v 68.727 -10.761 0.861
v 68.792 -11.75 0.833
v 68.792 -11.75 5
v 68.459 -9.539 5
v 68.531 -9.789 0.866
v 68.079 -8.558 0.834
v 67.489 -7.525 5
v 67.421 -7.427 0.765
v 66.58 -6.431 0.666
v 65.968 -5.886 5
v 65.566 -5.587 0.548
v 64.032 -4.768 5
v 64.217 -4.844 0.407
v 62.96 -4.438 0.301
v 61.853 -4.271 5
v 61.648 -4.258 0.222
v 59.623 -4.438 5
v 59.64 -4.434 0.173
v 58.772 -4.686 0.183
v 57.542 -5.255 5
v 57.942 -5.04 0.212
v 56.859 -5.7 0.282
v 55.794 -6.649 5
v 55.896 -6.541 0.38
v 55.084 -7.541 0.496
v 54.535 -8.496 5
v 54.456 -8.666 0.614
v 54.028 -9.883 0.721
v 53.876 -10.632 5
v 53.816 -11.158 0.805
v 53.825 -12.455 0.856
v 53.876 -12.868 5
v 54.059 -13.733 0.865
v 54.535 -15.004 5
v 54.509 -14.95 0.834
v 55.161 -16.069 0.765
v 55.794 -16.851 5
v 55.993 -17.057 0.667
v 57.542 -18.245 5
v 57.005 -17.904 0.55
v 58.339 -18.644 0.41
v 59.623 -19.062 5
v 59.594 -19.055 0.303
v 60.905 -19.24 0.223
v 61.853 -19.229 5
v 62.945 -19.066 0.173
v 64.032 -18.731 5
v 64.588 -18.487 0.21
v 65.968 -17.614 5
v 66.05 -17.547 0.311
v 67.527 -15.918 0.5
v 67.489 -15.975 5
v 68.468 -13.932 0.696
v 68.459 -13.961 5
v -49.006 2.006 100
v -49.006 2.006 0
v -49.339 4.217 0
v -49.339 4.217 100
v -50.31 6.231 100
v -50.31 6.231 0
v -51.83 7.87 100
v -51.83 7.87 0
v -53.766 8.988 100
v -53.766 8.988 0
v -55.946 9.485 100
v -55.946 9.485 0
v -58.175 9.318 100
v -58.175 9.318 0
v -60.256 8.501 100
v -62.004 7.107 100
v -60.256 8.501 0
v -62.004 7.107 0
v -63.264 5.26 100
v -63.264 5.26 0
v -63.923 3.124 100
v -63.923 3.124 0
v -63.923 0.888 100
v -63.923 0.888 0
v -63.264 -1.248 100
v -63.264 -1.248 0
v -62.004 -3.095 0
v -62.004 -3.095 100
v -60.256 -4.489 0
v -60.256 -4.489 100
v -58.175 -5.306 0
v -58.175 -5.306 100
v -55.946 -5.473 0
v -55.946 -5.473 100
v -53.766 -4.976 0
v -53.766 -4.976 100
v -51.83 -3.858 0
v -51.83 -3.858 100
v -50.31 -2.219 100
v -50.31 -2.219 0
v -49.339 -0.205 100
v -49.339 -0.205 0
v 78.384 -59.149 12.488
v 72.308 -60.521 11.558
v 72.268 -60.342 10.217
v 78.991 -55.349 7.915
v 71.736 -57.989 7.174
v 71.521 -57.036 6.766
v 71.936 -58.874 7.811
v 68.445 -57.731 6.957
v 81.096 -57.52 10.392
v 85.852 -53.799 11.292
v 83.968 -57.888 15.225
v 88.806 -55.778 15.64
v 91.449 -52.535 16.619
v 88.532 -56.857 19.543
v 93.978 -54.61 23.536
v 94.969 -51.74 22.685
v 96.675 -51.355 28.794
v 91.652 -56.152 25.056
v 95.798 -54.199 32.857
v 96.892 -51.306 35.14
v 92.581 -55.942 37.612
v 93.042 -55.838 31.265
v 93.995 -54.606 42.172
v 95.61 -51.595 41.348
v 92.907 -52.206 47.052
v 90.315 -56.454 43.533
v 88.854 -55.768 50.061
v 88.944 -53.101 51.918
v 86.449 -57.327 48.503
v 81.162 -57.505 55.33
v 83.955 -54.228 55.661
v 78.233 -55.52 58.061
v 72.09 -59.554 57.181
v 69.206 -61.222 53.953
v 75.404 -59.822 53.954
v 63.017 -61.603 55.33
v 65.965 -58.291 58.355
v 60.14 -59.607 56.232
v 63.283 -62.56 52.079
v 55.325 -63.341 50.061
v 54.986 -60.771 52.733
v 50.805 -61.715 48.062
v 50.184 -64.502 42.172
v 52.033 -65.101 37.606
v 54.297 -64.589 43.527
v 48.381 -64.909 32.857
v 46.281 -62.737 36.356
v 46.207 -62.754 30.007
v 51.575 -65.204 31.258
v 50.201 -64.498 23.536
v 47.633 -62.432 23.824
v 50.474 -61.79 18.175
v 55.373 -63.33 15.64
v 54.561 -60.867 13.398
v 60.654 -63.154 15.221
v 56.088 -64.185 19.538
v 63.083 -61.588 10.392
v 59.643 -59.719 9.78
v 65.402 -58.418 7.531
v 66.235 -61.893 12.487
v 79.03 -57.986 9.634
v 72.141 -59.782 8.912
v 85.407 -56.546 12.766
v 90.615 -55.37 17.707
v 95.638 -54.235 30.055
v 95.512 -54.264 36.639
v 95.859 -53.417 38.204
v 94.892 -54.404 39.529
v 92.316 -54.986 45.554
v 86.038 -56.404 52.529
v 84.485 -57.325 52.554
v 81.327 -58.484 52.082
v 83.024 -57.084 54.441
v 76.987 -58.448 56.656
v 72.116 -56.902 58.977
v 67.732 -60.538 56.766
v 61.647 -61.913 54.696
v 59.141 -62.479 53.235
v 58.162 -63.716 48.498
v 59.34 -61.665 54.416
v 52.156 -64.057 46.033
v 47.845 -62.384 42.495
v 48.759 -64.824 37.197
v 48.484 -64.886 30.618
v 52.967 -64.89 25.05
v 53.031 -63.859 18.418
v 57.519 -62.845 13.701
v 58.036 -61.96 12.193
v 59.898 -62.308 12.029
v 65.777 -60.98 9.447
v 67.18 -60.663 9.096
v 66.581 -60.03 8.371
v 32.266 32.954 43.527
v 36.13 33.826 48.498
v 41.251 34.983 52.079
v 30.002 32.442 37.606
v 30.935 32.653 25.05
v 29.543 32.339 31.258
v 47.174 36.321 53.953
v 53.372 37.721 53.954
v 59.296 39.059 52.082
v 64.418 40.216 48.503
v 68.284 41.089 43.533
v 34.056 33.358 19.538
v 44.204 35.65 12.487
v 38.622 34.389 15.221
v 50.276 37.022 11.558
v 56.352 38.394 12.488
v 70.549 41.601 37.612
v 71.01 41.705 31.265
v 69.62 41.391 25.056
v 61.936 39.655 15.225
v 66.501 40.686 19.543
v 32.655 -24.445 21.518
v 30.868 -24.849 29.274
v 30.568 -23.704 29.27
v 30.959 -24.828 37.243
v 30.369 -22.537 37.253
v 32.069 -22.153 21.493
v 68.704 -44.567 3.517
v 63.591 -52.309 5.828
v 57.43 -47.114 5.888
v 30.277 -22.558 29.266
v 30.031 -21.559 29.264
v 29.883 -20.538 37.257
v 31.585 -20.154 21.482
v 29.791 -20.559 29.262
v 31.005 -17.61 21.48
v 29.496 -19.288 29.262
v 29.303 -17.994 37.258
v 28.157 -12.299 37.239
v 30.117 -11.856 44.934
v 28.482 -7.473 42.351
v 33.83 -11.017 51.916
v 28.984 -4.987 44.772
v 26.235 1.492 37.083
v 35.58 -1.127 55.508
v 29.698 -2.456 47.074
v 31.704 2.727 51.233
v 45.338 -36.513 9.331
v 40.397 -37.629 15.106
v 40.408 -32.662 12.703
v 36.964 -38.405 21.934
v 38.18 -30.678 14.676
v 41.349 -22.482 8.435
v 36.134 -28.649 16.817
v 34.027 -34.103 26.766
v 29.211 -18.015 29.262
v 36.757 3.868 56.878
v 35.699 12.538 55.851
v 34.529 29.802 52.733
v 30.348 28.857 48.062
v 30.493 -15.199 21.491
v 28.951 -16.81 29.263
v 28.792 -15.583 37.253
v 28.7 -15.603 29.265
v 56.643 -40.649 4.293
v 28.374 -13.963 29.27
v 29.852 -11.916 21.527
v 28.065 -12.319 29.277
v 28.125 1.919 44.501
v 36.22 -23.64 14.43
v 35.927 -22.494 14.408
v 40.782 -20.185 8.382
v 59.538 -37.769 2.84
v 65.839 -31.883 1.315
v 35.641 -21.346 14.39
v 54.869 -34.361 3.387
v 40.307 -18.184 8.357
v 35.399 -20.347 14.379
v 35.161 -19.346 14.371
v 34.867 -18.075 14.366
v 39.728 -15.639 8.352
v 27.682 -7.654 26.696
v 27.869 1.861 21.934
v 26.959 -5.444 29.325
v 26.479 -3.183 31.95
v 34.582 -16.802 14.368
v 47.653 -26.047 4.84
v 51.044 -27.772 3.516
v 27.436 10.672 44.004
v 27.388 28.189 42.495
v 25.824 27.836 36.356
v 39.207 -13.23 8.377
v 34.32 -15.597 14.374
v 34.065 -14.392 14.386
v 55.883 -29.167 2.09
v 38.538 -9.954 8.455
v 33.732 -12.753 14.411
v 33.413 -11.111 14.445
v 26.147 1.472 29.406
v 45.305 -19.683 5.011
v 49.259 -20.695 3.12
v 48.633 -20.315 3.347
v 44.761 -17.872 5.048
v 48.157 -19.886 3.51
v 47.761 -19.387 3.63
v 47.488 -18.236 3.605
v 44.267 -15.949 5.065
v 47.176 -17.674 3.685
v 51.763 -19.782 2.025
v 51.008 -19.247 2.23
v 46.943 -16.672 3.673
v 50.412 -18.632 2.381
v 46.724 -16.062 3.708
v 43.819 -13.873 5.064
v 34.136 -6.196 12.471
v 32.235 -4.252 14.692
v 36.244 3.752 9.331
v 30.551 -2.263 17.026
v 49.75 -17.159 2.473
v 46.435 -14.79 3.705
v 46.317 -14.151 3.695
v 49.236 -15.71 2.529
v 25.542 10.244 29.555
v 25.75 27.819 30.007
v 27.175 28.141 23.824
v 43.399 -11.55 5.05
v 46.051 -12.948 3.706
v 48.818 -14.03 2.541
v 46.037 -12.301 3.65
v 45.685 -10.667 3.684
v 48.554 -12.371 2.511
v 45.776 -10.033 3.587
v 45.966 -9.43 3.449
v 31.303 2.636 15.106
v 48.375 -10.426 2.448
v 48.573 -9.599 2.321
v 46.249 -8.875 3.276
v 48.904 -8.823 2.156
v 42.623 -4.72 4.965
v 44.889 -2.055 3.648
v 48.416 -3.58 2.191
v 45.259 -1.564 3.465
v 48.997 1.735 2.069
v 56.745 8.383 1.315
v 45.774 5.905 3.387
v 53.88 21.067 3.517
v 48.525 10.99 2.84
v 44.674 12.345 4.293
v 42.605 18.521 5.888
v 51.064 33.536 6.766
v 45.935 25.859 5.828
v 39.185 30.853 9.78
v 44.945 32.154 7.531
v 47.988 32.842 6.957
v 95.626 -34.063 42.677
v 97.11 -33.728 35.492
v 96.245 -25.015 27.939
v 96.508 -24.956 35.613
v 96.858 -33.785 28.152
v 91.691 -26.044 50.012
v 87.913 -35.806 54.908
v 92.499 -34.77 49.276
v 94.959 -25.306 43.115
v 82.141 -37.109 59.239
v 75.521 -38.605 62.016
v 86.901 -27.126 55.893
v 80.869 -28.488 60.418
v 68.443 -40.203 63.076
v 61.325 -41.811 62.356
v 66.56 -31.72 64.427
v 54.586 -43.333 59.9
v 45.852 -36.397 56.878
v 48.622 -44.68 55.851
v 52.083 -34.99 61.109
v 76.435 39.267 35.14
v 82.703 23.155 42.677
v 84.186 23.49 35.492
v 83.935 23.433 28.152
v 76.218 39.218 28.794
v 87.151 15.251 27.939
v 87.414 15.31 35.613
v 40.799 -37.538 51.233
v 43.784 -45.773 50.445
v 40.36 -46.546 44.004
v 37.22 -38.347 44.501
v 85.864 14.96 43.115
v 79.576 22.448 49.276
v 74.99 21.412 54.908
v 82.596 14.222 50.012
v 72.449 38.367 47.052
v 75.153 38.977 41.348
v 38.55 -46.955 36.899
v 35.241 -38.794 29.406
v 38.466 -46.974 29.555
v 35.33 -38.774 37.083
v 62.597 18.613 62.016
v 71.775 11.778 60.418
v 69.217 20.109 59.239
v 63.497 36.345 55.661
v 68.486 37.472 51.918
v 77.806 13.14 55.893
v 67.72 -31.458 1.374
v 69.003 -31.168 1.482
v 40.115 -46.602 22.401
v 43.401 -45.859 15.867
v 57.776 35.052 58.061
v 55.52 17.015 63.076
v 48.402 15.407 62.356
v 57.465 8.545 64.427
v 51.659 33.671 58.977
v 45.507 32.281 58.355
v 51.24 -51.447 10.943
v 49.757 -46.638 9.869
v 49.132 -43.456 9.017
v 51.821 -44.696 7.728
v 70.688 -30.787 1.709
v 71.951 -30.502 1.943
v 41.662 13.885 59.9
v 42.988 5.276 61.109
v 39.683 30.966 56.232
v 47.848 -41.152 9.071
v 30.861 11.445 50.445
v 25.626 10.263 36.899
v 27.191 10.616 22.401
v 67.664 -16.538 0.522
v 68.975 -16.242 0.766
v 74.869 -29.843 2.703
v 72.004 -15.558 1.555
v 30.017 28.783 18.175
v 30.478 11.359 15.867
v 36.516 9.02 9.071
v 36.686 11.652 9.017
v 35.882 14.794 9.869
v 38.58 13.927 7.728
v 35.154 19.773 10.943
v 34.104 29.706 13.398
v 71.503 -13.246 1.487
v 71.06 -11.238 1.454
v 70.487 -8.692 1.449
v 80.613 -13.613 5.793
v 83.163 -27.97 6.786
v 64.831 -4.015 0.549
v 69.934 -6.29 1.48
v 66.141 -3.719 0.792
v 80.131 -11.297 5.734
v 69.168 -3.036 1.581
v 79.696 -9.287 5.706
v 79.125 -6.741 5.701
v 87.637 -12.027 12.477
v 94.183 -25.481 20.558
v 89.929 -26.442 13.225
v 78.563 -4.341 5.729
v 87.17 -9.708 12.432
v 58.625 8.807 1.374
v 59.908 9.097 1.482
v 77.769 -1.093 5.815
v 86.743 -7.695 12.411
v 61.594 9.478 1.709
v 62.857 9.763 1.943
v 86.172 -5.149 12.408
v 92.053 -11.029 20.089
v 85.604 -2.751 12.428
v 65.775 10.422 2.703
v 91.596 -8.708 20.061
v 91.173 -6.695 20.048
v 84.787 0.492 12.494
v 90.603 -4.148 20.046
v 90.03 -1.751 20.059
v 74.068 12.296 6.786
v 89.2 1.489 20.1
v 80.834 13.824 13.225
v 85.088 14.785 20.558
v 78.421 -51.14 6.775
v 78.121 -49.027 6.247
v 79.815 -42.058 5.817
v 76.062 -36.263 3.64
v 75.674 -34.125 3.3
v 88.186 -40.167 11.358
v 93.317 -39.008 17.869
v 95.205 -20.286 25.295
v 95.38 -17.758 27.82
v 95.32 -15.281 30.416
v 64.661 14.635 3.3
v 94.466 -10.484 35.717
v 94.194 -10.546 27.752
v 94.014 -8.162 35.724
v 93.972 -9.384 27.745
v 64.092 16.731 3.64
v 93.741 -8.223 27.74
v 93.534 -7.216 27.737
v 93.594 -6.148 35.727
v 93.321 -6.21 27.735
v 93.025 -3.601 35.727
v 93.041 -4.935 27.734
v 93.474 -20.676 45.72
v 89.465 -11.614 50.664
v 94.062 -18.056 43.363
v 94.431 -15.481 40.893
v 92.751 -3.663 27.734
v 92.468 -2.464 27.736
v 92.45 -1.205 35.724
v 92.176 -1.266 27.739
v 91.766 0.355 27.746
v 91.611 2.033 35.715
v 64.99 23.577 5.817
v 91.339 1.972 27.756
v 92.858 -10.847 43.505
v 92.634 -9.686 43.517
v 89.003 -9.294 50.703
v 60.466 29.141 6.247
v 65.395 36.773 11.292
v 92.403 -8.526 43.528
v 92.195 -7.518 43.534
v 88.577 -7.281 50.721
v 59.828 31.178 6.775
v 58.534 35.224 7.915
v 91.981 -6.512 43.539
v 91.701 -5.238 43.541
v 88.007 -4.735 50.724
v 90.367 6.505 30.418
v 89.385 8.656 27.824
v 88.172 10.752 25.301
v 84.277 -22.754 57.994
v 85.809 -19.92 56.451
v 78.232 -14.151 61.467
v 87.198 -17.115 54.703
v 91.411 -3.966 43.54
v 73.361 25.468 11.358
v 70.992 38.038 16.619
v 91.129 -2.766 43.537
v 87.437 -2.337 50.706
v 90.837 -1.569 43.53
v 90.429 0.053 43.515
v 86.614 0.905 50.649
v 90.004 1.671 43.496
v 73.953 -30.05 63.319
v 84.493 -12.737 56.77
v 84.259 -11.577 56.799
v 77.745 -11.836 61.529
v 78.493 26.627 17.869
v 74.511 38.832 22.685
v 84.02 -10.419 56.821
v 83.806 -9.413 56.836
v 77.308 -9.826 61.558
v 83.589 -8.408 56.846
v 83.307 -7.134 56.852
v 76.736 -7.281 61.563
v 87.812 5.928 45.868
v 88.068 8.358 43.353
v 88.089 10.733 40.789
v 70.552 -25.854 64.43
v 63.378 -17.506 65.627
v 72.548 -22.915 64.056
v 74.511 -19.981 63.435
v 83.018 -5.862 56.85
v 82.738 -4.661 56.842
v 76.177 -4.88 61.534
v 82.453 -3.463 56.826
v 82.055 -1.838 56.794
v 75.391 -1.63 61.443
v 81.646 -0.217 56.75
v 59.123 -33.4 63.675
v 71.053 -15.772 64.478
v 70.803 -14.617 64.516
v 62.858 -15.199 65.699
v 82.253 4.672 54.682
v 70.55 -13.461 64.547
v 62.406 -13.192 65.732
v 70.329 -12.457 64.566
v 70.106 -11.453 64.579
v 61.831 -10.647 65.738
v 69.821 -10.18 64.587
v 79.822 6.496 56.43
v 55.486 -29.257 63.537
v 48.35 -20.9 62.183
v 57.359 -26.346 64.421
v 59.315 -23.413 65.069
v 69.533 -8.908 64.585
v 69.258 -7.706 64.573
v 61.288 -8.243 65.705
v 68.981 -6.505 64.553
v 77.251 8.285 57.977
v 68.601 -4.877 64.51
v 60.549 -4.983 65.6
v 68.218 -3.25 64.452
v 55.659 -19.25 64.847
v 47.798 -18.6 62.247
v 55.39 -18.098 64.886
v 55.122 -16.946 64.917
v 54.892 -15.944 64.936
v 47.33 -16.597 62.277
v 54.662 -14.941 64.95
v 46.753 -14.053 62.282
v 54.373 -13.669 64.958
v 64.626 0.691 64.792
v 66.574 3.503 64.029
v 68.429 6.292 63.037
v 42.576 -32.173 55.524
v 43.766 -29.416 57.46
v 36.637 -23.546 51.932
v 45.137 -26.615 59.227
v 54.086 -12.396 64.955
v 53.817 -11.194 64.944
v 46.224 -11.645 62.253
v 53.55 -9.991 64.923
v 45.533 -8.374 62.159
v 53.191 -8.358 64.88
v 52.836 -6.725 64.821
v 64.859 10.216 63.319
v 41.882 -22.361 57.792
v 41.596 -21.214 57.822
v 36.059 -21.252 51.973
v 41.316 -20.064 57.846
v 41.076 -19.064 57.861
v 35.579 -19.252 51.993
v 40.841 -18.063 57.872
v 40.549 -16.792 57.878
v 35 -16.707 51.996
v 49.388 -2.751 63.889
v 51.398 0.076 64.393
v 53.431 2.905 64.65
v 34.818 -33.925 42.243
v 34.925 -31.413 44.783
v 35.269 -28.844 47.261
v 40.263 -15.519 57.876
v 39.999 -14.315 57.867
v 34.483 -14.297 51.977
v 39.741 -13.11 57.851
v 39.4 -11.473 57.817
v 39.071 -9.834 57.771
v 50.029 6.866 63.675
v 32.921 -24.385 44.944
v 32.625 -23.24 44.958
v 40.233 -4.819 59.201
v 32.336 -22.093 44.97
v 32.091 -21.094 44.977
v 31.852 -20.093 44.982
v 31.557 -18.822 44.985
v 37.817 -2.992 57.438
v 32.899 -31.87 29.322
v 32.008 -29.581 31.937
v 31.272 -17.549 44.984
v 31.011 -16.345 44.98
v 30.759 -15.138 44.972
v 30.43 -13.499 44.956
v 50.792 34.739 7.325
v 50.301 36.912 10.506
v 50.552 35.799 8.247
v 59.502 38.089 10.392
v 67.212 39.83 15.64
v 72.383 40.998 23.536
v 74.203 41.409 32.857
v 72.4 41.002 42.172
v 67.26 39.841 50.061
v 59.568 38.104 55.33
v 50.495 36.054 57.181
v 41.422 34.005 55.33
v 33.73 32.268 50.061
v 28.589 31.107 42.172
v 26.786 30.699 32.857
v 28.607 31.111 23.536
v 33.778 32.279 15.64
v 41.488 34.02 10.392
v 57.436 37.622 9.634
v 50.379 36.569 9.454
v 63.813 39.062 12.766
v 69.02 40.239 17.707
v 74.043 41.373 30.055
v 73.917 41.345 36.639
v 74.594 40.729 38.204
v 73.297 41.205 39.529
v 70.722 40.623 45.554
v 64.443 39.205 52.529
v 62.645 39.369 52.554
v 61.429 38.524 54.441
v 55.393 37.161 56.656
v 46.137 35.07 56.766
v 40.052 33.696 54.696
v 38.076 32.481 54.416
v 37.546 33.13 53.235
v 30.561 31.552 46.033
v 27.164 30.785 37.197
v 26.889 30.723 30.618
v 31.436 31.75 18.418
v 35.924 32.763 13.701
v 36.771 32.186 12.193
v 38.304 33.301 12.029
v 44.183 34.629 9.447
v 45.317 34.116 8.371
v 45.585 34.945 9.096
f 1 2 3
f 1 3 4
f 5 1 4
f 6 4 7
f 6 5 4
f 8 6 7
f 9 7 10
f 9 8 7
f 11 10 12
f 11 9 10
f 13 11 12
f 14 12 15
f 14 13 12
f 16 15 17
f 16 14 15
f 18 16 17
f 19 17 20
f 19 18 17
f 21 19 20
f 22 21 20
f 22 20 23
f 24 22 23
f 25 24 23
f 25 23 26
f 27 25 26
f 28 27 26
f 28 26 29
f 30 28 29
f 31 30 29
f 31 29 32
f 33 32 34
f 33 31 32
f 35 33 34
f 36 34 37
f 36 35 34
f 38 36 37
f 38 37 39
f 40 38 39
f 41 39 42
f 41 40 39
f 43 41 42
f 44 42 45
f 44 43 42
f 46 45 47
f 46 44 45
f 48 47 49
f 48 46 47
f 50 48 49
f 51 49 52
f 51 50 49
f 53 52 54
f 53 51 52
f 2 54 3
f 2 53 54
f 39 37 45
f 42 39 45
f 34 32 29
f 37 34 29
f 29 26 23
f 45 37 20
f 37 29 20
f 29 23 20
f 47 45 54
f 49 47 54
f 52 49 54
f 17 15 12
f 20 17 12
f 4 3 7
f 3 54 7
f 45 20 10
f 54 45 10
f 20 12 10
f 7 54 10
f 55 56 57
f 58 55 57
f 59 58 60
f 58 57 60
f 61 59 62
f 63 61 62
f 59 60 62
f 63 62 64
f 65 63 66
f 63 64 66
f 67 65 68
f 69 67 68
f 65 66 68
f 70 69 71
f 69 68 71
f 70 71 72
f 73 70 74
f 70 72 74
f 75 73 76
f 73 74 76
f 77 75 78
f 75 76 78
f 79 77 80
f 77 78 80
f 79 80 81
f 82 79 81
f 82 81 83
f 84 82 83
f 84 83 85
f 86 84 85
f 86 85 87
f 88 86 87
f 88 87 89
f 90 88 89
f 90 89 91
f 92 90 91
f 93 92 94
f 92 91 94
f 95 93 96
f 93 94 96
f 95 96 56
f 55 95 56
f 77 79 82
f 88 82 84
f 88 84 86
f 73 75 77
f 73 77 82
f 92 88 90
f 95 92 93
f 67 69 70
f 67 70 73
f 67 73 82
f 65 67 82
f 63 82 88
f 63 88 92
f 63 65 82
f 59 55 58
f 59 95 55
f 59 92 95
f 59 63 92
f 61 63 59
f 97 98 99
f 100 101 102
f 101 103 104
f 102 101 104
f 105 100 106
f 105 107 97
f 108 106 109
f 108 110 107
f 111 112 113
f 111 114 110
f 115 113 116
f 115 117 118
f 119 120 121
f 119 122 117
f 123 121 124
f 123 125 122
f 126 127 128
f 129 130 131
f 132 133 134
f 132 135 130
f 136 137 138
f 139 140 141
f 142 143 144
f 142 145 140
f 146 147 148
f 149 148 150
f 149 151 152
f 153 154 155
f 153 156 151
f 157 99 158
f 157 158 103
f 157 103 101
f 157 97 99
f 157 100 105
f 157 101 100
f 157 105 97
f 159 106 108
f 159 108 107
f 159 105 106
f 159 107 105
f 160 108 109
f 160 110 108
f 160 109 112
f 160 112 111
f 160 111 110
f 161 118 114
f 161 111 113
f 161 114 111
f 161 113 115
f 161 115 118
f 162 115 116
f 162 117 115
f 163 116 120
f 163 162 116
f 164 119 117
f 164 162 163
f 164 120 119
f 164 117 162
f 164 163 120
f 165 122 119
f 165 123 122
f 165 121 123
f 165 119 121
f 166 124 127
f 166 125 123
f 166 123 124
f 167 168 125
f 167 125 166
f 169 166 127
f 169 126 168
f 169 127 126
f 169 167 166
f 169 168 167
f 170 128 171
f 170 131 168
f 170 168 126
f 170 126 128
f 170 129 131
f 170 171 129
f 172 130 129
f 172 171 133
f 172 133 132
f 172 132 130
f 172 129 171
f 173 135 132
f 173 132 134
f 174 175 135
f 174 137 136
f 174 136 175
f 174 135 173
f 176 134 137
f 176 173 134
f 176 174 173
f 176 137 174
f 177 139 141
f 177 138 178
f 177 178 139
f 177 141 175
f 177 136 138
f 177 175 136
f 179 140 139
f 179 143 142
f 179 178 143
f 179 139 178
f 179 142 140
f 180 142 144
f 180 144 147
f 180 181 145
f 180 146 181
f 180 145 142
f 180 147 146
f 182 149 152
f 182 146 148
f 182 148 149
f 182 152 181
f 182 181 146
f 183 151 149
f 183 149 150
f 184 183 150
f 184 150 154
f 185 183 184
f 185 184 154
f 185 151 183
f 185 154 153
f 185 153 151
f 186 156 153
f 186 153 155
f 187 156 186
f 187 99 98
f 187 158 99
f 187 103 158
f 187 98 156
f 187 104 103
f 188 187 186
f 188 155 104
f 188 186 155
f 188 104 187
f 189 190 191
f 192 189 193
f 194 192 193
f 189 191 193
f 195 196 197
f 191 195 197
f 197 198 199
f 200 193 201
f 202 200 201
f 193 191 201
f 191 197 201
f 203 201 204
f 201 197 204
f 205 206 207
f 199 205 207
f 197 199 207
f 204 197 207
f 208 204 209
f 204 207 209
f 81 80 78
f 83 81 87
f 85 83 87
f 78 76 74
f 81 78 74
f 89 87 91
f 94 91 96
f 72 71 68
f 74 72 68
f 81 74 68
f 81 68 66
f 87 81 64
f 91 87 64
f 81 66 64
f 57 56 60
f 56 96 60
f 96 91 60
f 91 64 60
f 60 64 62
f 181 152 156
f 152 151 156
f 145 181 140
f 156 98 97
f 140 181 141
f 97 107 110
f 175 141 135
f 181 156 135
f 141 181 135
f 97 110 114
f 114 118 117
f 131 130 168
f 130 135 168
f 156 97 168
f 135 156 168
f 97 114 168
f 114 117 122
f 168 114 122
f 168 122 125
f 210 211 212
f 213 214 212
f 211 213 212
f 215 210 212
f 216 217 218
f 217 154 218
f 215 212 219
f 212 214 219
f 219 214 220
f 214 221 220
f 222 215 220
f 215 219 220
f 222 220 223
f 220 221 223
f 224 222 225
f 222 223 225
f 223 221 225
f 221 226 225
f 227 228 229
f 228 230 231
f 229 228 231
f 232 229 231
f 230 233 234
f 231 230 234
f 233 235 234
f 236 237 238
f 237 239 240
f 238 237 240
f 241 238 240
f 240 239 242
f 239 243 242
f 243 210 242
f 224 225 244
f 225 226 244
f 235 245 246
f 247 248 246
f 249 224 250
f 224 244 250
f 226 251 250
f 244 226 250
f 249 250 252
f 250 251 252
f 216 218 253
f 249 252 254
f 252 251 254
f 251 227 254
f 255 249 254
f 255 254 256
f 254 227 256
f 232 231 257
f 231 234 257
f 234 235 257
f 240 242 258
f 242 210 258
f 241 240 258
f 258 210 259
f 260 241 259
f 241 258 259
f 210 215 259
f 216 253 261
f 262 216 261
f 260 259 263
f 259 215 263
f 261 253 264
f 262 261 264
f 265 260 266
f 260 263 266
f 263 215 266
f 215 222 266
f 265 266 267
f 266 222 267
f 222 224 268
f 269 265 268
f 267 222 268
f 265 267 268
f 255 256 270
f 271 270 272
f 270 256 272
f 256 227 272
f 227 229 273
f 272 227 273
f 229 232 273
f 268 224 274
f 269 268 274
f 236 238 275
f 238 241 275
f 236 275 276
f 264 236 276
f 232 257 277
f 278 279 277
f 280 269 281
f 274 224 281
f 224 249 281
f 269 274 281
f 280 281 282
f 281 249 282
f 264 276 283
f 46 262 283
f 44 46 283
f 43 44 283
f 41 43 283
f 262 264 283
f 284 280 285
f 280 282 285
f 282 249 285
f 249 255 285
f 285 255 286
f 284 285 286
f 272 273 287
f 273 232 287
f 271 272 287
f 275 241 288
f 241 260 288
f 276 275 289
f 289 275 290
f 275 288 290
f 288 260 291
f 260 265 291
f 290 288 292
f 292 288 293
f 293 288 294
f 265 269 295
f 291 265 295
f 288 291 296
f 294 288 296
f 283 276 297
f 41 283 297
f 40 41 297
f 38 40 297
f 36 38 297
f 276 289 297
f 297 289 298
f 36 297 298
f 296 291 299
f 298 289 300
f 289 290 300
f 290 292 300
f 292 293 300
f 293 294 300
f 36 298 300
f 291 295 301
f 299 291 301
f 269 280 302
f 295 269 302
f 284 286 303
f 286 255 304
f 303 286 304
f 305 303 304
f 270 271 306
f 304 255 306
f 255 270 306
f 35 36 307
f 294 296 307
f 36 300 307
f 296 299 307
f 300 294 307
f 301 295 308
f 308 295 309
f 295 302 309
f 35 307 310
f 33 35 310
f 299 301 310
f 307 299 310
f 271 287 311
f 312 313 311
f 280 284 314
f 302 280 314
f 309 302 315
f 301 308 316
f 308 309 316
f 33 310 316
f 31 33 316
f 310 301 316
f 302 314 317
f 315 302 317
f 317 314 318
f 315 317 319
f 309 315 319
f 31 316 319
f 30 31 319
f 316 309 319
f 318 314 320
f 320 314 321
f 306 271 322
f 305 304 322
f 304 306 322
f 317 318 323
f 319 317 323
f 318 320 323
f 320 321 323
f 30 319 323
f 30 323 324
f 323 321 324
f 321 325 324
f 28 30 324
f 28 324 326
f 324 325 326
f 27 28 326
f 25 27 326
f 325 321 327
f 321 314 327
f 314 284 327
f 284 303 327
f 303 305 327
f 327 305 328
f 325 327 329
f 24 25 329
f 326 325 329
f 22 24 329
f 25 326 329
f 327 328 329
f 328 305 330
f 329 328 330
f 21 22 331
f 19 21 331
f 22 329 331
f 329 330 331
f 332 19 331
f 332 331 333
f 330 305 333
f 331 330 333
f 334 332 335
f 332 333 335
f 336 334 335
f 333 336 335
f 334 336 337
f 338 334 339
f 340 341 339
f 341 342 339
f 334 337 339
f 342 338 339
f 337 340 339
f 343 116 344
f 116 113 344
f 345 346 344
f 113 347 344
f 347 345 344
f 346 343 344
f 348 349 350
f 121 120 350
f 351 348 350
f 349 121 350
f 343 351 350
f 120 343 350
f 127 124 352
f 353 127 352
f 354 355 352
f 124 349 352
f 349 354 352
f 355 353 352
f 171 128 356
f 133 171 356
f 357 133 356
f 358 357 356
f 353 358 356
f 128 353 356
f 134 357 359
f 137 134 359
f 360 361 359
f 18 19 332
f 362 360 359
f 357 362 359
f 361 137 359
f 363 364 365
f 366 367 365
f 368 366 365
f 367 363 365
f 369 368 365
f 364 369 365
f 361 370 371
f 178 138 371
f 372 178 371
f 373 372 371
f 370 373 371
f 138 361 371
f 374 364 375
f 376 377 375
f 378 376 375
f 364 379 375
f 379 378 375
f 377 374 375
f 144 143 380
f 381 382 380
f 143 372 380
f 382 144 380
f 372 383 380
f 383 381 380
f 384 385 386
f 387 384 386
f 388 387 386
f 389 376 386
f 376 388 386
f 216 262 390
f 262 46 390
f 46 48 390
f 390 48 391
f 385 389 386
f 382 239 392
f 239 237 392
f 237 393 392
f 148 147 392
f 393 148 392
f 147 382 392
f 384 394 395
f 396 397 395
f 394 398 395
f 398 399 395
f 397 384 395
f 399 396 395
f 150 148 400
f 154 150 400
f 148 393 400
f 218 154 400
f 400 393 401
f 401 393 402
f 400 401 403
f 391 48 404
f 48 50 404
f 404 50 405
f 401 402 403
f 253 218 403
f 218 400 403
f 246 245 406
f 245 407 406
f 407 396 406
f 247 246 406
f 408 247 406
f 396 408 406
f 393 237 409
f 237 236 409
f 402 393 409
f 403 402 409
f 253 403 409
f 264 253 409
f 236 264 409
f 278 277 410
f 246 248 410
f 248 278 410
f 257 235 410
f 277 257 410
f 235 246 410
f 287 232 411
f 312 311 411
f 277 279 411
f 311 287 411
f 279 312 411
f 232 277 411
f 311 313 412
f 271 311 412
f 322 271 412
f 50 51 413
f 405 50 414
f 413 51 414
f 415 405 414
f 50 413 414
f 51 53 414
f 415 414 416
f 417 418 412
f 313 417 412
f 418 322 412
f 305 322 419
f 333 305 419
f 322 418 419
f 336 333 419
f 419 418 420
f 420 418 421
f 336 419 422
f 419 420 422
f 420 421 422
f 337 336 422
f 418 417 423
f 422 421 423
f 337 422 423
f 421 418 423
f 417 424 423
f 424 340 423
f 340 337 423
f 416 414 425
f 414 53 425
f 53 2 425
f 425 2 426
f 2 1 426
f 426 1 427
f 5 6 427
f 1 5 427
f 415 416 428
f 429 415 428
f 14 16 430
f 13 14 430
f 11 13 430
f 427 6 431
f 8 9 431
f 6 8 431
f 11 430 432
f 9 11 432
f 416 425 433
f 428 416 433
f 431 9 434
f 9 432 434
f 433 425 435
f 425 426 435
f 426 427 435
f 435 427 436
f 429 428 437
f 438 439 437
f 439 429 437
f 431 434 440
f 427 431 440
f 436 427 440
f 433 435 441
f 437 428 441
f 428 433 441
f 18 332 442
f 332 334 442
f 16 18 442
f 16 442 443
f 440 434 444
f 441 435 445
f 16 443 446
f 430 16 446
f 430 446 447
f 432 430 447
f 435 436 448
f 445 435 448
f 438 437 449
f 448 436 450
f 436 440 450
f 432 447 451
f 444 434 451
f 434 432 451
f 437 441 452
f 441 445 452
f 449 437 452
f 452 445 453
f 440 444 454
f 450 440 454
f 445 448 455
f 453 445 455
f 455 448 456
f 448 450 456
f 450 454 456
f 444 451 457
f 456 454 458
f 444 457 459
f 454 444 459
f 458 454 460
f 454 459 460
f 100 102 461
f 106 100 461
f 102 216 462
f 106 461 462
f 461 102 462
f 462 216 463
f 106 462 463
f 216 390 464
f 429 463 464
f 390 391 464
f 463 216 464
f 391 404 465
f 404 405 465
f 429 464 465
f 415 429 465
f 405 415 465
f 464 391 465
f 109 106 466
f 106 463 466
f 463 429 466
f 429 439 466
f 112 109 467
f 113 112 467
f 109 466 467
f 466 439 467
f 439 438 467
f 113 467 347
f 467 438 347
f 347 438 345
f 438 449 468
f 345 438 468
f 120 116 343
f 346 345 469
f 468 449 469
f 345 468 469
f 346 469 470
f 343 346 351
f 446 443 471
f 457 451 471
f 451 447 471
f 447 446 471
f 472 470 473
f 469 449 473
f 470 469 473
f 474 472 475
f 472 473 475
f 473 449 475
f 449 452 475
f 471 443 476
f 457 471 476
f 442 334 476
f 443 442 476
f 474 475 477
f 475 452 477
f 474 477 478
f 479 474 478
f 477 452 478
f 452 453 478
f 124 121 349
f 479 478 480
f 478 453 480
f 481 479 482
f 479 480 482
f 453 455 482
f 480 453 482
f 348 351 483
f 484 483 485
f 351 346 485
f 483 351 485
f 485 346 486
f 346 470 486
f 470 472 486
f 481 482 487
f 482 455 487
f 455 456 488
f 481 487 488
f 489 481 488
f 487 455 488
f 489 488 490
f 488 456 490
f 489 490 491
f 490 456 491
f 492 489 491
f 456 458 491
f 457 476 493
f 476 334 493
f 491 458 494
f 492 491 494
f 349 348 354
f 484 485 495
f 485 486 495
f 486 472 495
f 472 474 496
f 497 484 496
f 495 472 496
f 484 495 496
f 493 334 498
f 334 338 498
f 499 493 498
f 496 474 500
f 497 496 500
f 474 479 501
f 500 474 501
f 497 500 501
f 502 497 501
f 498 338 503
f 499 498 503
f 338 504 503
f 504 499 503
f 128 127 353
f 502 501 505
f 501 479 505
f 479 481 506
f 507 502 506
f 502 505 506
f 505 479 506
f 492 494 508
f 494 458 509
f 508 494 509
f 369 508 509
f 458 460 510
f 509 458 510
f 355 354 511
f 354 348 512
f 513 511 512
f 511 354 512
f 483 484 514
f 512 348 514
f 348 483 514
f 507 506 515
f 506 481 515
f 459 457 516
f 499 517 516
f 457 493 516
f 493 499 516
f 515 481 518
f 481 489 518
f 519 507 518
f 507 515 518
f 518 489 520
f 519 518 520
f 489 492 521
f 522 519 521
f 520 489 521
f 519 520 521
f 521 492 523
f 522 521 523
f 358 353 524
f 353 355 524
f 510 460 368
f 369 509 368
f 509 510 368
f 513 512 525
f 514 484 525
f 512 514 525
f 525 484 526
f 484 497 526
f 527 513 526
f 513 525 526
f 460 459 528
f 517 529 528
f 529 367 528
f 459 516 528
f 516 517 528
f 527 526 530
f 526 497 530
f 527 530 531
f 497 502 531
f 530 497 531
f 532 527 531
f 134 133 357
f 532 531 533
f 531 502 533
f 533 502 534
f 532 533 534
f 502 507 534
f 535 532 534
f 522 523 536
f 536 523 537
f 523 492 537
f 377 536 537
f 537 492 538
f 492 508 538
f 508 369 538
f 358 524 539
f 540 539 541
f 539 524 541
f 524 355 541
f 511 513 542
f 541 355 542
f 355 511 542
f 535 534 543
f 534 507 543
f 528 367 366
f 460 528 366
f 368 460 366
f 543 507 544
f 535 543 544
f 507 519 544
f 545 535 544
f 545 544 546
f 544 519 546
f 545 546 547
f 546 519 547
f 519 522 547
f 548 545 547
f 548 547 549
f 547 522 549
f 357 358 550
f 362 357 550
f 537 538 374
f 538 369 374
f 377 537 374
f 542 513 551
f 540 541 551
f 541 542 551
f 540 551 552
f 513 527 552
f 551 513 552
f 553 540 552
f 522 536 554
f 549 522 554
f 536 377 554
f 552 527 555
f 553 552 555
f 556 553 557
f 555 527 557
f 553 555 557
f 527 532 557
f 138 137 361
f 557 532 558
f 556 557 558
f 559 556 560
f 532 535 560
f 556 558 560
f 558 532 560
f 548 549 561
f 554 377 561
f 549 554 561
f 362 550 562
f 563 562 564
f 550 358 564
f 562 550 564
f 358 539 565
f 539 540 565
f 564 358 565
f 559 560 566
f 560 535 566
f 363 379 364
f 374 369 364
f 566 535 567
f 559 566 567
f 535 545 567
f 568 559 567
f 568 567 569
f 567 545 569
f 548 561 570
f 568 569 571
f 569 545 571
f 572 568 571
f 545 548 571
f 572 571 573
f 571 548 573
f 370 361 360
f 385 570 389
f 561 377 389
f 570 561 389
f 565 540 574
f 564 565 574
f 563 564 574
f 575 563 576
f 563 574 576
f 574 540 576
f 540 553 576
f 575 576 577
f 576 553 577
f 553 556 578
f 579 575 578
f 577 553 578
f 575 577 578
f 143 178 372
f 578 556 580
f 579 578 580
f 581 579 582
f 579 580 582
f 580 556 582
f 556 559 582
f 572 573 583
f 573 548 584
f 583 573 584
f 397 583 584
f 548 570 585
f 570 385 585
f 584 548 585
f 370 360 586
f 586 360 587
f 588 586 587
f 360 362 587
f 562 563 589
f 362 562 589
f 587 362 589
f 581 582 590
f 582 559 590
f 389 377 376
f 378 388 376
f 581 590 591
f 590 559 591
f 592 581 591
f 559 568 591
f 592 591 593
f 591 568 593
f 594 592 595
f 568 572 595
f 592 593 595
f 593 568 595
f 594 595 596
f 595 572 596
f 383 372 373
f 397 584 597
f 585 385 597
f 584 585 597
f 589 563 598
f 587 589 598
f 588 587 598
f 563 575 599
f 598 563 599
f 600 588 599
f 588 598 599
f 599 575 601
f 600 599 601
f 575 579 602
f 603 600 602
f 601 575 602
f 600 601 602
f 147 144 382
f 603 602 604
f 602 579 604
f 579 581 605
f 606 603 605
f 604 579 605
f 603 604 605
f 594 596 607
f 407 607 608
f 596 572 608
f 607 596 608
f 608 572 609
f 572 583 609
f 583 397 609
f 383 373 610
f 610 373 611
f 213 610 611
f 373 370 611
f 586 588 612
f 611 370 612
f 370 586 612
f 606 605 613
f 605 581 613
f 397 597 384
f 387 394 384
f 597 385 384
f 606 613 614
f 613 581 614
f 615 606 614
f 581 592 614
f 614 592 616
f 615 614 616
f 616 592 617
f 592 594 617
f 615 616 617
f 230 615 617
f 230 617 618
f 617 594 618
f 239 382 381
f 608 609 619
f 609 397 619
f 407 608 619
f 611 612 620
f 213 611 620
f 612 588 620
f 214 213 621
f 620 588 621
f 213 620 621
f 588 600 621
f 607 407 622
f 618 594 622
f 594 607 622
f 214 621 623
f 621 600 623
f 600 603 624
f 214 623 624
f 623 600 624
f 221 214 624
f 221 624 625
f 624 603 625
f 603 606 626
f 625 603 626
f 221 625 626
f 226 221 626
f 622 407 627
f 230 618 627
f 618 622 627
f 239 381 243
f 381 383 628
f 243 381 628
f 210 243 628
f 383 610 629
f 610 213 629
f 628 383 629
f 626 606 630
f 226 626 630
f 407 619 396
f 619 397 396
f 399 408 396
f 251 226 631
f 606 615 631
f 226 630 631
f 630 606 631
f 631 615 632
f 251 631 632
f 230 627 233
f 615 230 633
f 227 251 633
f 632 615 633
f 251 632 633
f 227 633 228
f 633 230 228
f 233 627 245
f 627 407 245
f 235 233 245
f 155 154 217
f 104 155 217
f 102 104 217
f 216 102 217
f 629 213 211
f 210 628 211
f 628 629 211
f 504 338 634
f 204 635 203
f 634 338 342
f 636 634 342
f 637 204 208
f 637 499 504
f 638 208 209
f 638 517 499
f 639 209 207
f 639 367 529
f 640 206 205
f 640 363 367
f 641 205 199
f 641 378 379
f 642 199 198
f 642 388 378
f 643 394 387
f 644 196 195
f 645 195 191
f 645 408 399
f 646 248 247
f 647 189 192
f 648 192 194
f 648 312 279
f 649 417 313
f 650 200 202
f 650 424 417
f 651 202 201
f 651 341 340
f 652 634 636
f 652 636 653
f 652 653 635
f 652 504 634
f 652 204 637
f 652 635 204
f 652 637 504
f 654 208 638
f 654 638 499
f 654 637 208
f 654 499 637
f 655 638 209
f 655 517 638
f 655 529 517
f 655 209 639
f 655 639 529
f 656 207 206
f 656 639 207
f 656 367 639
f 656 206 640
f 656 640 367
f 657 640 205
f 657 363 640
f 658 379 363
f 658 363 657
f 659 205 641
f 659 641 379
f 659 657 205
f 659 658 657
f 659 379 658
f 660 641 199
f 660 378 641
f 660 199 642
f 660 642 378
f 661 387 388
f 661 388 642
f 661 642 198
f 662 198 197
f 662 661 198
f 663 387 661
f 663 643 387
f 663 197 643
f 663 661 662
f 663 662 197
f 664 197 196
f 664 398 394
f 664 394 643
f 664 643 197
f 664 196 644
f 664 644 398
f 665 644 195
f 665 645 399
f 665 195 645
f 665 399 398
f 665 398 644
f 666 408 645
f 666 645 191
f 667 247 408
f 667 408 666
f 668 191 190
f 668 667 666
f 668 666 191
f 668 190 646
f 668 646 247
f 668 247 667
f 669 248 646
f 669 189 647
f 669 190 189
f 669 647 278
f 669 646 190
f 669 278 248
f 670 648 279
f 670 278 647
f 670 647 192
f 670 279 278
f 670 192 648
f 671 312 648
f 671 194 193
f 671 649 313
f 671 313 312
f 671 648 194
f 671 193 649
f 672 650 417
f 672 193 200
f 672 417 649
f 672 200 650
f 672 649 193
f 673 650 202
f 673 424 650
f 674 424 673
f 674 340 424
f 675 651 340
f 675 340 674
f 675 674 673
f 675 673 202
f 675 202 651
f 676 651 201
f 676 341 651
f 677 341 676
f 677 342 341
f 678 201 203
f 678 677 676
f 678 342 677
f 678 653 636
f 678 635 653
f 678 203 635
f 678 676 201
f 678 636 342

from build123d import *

# Parameters (mm, degrees)
F0_R     = 7.5
F1_DEPTH = 100
F2_R     = 7.5
F6_DEPTH = 5
F7_R     = 5


with BuildPart() as f1:
    # F0 (on Top) → F1 (new body)
    with BuildSketch(Plane.XY):
        with Locations((-56.5062947127, 2.0060208651)):
            Circle(F0_R)
    extrude(amount=F1_DEPTH)


with BuildPart() as f5:
    # F4 (on line) → F5 (revolve)
    with BuildSketch(Plane(origin=(55.7920094518, 12.6015113593, 0), x_dir=(-0.2203160277, 0.9754285458, 0), z_dir=(0.9754285458, 0.2203160277, 0))):
        with BuildLine():
            Line((-74.9648162349, 32.8749385259), (-74.9648162349, 7.8749385259))
            ThreePointArc((-74.9648162349, 7.8749385259), (-24.9648162349, 0), (25.0351837651, 7.8749385259))
            Line((25.0351837651, 7.8749385259), (25.0351837651, 32.8749385259))
            Line((25.0351837651, 32.8749385259), (-74.9648162349, 32.8749385259))
        make_face()
    revolve(axis=Axis((61.292158597, -11.7498830366, 32.8749385259), (0.2203160277, -0.9754285458, 0)))

    # F2 (on Top) → F6 (cut)
    with BuildSketch(Plane.XY):
        with Locations((61.292158597, -11.7498830366)):
            Circle(F2_R)
    extrude(amount=F6_DEPTH, mode=Mode.SUBTRACT)

    # F7
    f7_edges = [f5.edges().sort_by_distance(p)[0] for p in [
        (72.30796, -60.52131, 57.874939),
        (50.276357, 37.021544, 57.874939),
    ]]
    fillet(f7_edges, radius=F7_R)


solid = Compound([f1.part, f5.part])
